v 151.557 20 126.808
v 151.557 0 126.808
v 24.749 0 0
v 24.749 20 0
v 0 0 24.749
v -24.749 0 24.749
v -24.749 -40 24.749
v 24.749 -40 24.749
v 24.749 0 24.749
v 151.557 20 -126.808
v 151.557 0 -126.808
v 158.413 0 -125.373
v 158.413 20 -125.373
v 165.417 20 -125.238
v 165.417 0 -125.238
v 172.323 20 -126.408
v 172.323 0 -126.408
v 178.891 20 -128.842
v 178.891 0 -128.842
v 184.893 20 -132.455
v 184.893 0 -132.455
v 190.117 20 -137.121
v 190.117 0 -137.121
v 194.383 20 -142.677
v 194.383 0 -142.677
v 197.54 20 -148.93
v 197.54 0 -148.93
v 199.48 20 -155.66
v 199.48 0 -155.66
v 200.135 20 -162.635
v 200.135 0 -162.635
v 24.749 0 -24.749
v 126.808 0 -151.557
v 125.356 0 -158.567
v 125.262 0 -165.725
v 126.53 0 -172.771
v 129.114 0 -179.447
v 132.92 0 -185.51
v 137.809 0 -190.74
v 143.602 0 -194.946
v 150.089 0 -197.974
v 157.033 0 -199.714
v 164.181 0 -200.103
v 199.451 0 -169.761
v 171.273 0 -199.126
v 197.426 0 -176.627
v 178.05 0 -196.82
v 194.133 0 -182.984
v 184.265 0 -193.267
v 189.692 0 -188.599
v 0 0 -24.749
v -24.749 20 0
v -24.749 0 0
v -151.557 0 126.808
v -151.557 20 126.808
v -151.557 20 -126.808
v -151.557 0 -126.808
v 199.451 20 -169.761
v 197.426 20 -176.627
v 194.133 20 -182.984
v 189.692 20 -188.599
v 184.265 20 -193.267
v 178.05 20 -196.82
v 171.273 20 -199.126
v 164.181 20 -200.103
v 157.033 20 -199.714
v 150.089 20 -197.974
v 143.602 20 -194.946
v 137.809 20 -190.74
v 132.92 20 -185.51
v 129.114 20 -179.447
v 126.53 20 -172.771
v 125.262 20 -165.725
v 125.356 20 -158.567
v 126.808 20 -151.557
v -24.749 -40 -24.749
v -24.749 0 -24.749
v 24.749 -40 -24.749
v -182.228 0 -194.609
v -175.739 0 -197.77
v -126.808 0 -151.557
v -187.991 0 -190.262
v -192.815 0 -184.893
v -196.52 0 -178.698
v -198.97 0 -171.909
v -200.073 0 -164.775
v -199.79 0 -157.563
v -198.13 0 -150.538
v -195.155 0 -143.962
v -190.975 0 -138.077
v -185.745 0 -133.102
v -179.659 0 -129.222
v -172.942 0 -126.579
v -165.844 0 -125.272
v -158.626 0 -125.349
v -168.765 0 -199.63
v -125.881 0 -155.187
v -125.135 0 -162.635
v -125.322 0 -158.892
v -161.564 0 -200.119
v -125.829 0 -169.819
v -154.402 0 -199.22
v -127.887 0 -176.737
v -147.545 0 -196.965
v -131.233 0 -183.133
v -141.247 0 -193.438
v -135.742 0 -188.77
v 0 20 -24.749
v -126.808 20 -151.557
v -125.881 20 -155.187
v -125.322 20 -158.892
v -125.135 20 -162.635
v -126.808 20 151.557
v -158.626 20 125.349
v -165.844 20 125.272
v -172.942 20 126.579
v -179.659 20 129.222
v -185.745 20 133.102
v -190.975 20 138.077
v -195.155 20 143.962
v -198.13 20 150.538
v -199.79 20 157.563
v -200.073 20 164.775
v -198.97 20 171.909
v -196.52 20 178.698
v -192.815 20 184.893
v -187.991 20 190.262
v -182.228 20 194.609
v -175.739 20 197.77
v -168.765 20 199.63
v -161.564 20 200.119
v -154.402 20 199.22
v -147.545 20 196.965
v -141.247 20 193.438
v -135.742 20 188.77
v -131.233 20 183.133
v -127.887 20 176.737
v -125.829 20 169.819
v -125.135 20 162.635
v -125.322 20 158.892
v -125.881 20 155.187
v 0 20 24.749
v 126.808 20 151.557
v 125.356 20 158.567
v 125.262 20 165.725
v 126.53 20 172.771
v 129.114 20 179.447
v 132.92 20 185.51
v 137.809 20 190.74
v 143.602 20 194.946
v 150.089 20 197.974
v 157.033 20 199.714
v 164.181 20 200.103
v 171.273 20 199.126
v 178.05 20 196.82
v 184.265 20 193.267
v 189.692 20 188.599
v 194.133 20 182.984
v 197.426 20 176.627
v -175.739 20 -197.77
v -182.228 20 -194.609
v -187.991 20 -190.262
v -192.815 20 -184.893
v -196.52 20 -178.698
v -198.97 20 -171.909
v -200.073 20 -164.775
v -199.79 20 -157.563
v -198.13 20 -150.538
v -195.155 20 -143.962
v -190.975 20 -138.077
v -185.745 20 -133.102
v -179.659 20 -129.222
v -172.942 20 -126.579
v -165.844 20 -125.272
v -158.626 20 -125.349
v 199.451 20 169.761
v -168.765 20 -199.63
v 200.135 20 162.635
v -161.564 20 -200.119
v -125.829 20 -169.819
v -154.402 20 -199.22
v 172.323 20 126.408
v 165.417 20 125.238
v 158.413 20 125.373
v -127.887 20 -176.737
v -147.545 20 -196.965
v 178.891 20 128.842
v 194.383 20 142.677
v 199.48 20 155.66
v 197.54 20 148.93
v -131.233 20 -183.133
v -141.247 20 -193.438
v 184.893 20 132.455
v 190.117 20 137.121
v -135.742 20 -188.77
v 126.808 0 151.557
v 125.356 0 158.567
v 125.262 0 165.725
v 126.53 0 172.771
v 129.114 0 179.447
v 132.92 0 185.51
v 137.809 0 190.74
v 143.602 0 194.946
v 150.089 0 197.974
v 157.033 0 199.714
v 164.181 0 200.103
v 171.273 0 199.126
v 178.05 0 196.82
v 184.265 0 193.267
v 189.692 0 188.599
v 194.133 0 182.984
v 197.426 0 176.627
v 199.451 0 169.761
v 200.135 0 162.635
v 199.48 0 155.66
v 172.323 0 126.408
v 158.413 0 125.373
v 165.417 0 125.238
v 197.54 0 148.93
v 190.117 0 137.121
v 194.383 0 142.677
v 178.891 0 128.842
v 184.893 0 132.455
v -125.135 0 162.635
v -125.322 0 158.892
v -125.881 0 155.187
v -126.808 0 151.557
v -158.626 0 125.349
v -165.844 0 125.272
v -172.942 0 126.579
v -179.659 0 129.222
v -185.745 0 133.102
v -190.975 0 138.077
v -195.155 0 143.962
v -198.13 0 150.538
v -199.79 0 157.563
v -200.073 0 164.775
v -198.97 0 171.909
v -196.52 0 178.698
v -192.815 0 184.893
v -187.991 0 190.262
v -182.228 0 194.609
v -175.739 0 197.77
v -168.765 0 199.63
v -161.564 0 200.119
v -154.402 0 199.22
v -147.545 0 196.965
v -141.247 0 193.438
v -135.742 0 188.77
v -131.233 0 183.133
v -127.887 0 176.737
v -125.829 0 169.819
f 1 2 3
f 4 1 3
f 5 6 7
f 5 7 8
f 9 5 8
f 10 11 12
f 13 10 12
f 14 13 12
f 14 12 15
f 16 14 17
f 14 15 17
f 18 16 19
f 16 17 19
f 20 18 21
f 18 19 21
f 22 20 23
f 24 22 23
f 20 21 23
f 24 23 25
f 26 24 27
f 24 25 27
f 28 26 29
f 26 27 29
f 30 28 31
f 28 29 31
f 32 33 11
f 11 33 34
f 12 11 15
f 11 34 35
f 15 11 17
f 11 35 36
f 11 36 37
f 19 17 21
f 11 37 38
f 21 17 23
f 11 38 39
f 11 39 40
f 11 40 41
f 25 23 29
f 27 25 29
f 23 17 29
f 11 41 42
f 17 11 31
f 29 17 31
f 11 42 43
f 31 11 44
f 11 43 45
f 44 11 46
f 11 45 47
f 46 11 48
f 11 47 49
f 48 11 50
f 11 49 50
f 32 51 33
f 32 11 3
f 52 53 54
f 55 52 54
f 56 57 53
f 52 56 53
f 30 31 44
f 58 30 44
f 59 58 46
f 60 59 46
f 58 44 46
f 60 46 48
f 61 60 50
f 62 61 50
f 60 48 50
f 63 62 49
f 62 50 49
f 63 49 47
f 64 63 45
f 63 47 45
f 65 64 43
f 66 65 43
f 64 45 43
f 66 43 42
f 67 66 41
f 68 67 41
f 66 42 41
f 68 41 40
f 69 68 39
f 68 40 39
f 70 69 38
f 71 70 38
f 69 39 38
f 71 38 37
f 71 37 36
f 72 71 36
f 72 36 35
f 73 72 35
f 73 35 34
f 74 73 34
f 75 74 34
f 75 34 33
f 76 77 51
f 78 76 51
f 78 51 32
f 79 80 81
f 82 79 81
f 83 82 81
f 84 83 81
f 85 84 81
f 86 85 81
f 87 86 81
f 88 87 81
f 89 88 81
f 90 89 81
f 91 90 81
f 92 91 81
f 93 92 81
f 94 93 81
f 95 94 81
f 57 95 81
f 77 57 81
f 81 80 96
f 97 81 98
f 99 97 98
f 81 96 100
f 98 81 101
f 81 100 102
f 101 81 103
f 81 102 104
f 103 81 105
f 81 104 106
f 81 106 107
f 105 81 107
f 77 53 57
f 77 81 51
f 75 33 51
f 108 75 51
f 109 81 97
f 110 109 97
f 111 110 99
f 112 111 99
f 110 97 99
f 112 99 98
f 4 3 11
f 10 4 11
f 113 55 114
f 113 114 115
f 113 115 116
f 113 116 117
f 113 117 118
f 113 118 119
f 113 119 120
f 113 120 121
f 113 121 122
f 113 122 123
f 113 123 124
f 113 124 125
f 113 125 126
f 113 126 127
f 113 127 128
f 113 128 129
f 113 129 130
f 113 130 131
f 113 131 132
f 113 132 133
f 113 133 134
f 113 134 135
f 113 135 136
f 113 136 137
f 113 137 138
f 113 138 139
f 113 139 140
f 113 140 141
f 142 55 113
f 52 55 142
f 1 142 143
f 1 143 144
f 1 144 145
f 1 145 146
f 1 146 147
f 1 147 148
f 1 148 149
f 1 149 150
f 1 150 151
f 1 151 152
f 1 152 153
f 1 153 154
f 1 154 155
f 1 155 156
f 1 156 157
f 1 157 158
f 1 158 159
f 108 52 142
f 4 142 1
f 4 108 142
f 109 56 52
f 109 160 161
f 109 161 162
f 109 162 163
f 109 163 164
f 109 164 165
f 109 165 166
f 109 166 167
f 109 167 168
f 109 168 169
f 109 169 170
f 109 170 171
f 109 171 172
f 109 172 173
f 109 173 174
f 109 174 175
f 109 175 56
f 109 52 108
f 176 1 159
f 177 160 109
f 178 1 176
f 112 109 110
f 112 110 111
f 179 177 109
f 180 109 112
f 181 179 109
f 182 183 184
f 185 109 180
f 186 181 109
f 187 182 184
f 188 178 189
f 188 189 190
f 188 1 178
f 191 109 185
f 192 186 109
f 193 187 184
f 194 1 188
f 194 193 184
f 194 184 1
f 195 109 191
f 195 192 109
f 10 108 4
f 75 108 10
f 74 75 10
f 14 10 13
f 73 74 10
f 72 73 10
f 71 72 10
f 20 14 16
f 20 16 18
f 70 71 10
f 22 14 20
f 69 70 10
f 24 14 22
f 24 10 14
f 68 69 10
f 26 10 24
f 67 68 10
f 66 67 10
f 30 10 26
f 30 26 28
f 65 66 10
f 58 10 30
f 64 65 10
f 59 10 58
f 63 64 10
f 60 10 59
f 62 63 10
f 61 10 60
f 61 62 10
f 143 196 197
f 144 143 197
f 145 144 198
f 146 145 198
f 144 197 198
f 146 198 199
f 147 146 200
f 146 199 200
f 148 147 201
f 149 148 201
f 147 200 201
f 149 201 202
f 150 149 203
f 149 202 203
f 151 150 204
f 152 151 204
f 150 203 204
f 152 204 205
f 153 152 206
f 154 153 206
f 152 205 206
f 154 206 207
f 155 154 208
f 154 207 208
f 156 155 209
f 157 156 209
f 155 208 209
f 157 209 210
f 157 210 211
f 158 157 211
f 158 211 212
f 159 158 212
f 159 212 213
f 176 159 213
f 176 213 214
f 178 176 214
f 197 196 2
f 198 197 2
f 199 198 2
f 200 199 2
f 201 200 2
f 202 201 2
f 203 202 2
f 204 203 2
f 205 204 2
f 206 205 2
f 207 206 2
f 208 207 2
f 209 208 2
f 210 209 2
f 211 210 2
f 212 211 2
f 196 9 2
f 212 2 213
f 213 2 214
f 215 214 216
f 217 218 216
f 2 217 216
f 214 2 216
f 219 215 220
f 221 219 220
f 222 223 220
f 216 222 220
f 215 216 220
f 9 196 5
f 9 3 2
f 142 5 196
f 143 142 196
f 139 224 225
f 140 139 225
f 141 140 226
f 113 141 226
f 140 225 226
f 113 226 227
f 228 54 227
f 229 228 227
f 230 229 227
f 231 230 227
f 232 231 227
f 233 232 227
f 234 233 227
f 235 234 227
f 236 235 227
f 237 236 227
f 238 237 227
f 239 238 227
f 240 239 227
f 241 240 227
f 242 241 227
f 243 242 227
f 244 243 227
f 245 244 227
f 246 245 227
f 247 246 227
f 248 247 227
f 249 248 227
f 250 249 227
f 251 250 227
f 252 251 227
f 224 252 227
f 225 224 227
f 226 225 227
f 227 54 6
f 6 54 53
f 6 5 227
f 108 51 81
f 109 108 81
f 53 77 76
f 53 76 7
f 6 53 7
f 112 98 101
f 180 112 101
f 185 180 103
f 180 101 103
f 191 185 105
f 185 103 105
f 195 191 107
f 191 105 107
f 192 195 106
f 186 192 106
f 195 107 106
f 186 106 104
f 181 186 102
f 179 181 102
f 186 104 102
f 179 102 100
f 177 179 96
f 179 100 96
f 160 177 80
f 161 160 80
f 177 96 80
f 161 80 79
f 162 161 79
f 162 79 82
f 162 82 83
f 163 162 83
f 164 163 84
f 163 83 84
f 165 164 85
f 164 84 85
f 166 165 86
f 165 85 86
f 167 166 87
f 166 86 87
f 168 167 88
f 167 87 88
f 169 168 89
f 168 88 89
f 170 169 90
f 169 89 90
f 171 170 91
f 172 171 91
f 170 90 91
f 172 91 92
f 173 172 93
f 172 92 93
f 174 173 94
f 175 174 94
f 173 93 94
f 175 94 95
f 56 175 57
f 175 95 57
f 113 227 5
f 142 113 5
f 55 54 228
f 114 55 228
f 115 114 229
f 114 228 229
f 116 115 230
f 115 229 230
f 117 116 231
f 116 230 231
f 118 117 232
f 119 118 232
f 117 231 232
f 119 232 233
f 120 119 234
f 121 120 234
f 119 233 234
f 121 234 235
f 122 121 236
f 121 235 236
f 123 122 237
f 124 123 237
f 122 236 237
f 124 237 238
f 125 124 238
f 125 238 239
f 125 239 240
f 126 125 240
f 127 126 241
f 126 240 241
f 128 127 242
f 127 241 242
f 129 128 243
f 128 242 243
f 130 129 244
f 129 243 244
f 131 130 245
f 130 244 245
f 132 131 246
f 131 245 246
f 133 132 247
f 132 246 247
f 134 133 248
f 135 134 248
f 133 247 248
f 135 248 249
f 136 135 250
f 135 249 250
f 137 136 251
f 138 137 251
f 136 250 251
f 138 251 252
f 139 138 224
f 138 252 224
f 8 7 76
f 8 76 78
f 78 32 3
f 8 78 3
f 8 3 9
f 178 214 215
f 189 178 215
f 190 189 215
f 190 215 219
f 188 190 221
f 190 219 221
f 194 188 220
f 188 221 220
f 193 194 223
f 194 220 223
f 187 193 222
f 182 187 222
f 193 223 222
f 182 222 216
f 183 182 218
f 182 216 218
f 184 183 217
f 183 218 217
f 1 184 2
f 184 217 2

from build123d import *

# Parameters (mm, degrees)
BOSS_EXTRUDE1_DEPTH = 20
SKETCH2_W           = 49.497474684
SKETCH2_H           = 49.497474684
BOSS_EXTRUDE2_DEPTH = 40


with BuildPart() as part:
    # Sketch1 → Boss-Extrude1 (new body)
    with BuildSketch(Plane(origin=(0, 0, 0), x_dir=(1, 0, 0), z_dir=(0, 1, 0))):
        with BuildLine():
            ThreePointArc((-126.808112203, -151.556849545), (-136.118055378, -136.118055378), (-151.556849545, -126.808112203))
            Line((-151.556849545, -126.808112203), (-175.008928344, -150.260191002))
            Line((-175.008928344, -150.260191002), (-150.260191002, -175.008928344))
            Line((-150.260191002, -175.008928344), (-126.808112203, -151.556849545))
        make_face()
        with BuildLine():
            Line((-175.008928344, -150.260191002), (-151.556849545, -126.808112203))
            ThreePointArc((-151.556849545, -126.808112203), (-192.814554121, -184.892545545), (-125.134559673, -162.634559673))
            ThreePointArc((-125.134559673, -162.634559673), (-125.555308196, -157.032853688), (-126.808112203, -151.556849545))
            Line((-126.808112203, -151.556849545), (-150.260191002, -175.008928344))
            Line((-150.260191002, -175.008928344), (-175.008928344, -150.260191002))
        make_face()
        with BuildLine():
            Line((-12.374368671, -12.374368671), (-24.748737342, 0))
            Line((-24.748737342, 0), (-151.556849545, -126.808112203))
            ThreePointArc((-151.556849545, -126.808112203), (-136.118055378, -136.118055378), (-126.808112203, -151.556849545))
            Line((-126.808112203, -151.556849545), (0, -24.748737342))
            Line((0, -24.748737342), (-12.374368671, -12.374368671))
        make_face()
        with BuildLine():
            ThreePointArc((-151.556849545, 126.808112203), (-136.118055378, 136.118055378), (-126.808112203, 151.556849545))
            Line((-126.808112203, 151.556849545), (-150.260191002, 175.008928344))
            Line((-150.260191002, 175.008928344), (-175.008928344, 150.260191002))
            Line((-175.008928344, 150.260191002), (-151.556849545, 126.808112203))
        make_face()
        with BuildLine():
            Line((-150.260191002, 175.008928344), (-126.808112203, 151.556849545))
            ThreePointArc((-126.808112203, 151.556849545), (-125.555308196, 157.032853688), (-125.134559673, 162.634559673))
            ThreePointArc((-125.134559673, 162.634559673), (-192.814554121, 184.892545545), (-151.556849545, 126.808112203))
            Line((-151.556849545, 126.808112203), (-175.008928344, 150.260191002))
            Line((-175.008928344, 150.260191002), (-150.260191002, 175.008928344))
        make_face()
        with BuildLine():
            Line((-24.748737342, 0), (-12.374368671, 12.374368671))
            Line((-12.374368671, 12.374368671), (0, 24.748737342))
            Line((0, 24.748737342), (-126.808112203, 151.556849545))
            ThreePointArc((-126.808112203, 151.556849545), (-136.118055378, 136.118055378), (-151.556849545, 126.808112203))
            Line((-151.556849545, 126.808112203), (-24.748737342, 0))
        make_face()
        with BuildLine():
            Line((126.808112203, 151.556849545), (0, 24.748737342))
            Line((0, 24.748737342), (12.374368671, 12.374368671))
            Line((12.374368671, 12.374368671), (24.748737342, 0))
            Line((24.748737342, 0), (151.556849545, 126.808112203))
            ThreePointArc((151.556849545, 126.808112203), (136.118055378, 136.118055378), (126.808112203, 151.556849545))
        make_face()
        with BuildLine():
            ThreePointArc((200.134559673, 162.634559673), (157.032853688, 199.713811149), (126.808112203, 151.556849545))
            Line((126.808112203, 151.556849545), (150.260191002, 175.008928344))
            Line((150.260191002, 175.008928344), (175.008928344, 150.260191002))
            Line((175.008928344, 150.260191002), (151.556849545, 126.808112203))
            ThreePointArc((151.556849545, 126.808112203), (184.892545545, 132.454565224), (200.134559673, 162.634559673))
        make_face()
        with BuildLine():
            Line((150.260191002, 175.008928344), (126.808112203, 151.556849545))
            ThreePointArc((126.808112203, 151.556849545), (136.118055378, 136.118055378), (151.556849545, 126.808112203))
            Line((151.556849545, 126.808112203), (175.008928344, 150.260191002))
            Line((175.008928344, 150.260191002), (150.260191002, 175.008928344))
        make_face()
        with BuildLine():
            Line((24.748737342, 0), (12.374368671, -12.374368671))
            Line((12.374368671, -12.374368671), (0, -24.748737342))
            Line((0, -24.748737342), (126.808112203, -151.556849545))
            ThreePointArc((126.808112203, -151.556849545), (136.118055378, -136.118055378), (151.556849545, -126.808112203))
            Line((151.556849545, -126.808112203), (24.748737342, 0))
        make_face()
        with BuildLine():
            ThreePointArc((200.134559673, -162.634559673), (184.892545545, -132.454565224), (151.556849545, -126.808112203))
            Line((151.556849545, -126.808112203), (175.008928344, -150.260191002))
            Line((175.008928344, -150.260191002), (150.260191002, -175.008928344))
            Line((150.260191002, -175.008928344), (126.808112203, -151.556849545))
            ThreePointArc((126.808112203, -151.556849545), (157.032853688, -199.713811149), (200.134559673, -162.634559673))
        make_face()
        with BuildLine():
            Line((175.008928344, -150.260191002), (151.556849545, -126.808112203))
            ThreePointArc((151.556849545, -126.808112203), (136.118055378, -136.118055378), (126.808112203, -151.556849545))
            Line((126.808112203, -151.556849545), (150.260191002, -175.008928344))
            Line((150.260191002, -175.008928344), (175.008928344, -150.260191002))
        make_face()
        Polygon((12.374368671, 12.374368671), (0, 0), (12.374368671, -12.374368671), (24.748737342, 0), align=None)
        Polygon((12.374368671, -12.374368671), (0, 0), (-12.374368671, -12.374368671), (0, -24.748737342), align=None)
        Polygon((0, 0), (-12.374368671, 12.374368671), (-24.748737342, 0), align=None)
        Polygon((0, 24.748737342), (-12.374368671, 12.374368671), (0, 0), (12.374368671, 12.374368671), align=None)
        Polygon((-12.374368671, -12.374368671), (0, 0), (-24.748737342, 0), align=None)
    extrude(amount=BOSS_EXTRUDE1_DEPTH)

    # Sketch2 → Boss-Extrude2 (add)
    with BuildSketch(Plane.XZ):
        Rectangle(SKETCH2_W, SKETCH2_H)
    extrude(amount=BOSS_EXTRUDE2_DEPTH)


solid = part.part
